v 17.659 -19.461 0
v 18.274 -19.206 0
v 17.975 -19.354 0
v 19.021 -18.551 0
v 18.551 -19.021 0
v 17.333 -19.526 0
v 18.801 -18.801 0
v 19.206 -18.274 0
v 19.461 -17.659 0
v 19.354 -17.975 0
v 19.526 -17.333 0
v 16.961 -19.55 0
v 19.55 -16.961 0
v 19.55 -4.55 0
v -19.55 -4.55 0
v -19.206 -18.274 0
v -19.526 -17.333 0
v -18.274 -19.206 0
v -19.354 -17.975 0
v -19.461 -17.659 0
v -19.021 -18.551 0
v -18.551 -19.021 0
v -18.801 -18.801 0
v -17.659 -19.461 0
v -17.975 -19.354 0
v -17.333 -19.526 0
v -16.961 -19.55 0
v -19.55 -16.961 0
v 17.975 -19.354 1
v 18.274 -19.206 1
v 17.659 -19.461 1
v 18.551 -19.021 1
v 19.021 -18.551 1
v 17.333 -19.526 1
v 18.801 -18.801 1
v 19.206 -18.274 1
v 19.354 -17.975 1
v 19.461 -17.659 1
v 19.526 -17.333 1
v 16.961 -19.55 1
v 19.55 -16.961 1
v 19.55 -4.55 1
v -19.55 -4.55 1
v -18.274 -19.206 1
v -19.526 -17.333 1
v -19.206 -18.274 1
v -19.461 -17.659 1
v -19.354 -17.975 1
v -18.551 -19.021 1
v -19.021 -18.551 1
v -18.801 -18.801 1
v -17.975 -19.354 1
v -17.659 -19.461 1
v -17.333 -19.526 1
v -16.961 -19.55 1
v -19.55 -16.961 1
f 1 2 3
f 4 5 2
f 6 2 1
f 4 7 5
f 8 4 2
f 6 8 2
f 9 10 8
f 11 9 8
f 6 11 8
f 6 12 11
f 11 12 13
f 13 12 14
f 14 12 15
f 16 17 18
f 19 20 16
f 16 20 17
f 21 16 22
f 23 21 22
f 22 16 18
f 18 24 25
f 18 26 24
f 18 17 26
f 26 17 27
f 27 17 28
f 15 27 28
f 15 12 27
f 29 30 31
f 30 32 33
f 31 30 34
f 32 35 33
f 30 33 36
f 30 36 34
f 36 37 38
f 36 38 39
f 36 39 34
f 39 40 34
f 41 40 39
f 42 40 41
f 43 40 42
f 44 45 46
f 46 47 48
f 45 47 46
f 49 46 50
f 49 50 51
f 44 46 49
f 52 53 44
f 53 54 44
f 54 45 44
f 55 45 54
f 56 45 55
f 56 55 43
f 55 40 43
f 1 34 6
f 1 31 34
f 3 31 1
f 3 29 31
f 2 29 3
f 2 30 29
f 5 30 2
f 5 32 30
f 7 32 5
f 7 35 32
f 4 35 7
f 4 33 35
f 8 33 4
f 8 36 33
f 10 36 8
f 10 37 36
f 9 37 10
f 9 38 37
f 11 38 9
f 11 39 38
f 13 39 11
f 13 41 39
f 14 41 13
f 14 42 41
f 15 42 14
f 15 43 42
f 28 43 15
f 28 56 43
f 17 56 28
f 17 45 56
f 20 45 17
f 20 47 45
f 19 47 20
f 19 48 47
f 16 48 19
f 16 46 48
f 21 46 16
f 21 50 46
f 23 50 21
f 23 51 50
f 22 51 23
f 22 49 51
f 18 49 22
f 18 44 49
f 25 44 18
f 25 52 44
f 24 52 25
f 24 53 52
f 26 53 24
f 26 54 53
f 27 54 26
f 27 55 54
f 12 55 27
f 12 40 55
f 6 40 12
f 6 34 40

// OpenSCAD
// Flex label (idea from MakerWorld "Gridfinity Flex label", 2026-11-01): a groove in the inside of the lip, the
// label a 1 mm plate bent in and sprung into the groove on the front and both sides. Everything stays under the
// stacking line (a bin stacked on top reaches down to 3.74 below the lip top), so the bins still stack.
//
// Light bin lip (scad/label_clip.scad has the measurements; y inwards from the outer face, z down from the lip top):
// the groove takes the place of the lip's bulge. Back at y = 1.0 (1.0 of wall stays), ceiling 45 deg (prints without
// support), floor flat at -5.25 on the lip's lower chamfer (1.3 mm ledge). Label 1.0 thick from -5.15 to -4.15; the
// ceiling holds its edge from above for 0.8 mm (the opening above it is at y 1.985).
//
//   part = "bin":   the light bin STL `bin` with the groove cut (cells_x x cells_y, any height)
//   part = "label": the label for a bin cells_x wide, `depth` deep, rounded front corners to follow the groove
//
// Stops (2026-11-02: 1- and 2-wide labels in a corner of a wider bin): at every joint between cells the groove
// is left out for STOP_W on the front and the back wall, so the lip's bulge stands there (to y 2.63) and stops a short
// label sliding out of its corner. A label crossing a joint has a notch for the stop (full-width labels too; notched
// labels still fit bins without stops). Corner label: `corner = "left"` or "right", `cells_x` long, in a bin `bin_x`
// wide; its end sits STOP_W / 2 + clr short of the joint. Spring it in like the full-width one (bow it slightly).
//
// Snap (2026-11-02: the corner labels and even a 2-wide label in a 2-wide bin fell out: the 1 mm plate lies loose
// in the groove, nothing holds its edge in). With `snap` the groove floor is a trench at the back (y GB to TRENCH_Y, down
// to -5.3) and a ledge in front of it (the rest of the lip's bulge, top at -4.9); the label gets a bead `snap` high under
// its edge that drops into the trench. To come out the bead has to climb the ledge, and the groove's ceiling over the
// label's edge leaves it no room to: it clicks in and out by bending (interference about snap - 0.25). Plate 0.9, top at
// -4.0, under the stacking line (-3.74). Snap labels print upside down (face with the text on the bed, the bead up).
// DejaVu Sans: from the system fonts (fonts-dejavu in the OpenSCAD image)

part = "label";
bin = "";            // the light bin STL to cut (part = "bin")
cells_x = 1;
cells_y = 1;
top = 0;             // z of the bin's lip top (part = "bin"; 7 * height + 3.74)
depth = 15;          // label depth, from the groove at the front
thick = 1.0;
clr = 0.2;           // label edge to the groove's back
walls = [1, 1, 1];   // groove in the front, left, right wall (the label is held on these three)
corner = "none";     // label: "none" = full width of a cells_x bin; "left" / "right" = corner label cells_x long in a bin_x bin
bin_x = 0;           // corner label: the bin's width in cells (0 = cells_x + 1; only the corner's shape matters)
centre = true;       // corner label: centred on x for printing (false: where it sits in the bin, for checks)
fit = undef;         // label: press fit instead of clr: the ends reach fit / 2 past the groove's back (side walls, divider tab), so the
                     // bendy walls press on them (2026-11-02: the loose labels fell out of the bins already printed)
tab = false;         // corner label: ends at a divider's tab (scad/rib_bin.scad tab = true) instead of a stop
DIV_T = 1.2;         // divider thickness (scad/rib_bin.scad T)
snap = 0;            // label: bead height under the edge (0 = none; for bins with the snap groove)
snap_thick = 0.9;    // snap label plate (1.0 touches the lip at the bin's corners by 0.05)
txt = "";
txt_size = 6;
txt_depth = 0.4;

$fn = 48;
R = 3.75;
GB = 1.0;                       // groove back
G_TOP = -4.05; G_FLOOR = -5.25; // groove flat back from G_TOP to G_FLOOR
STOP_W = 2.0;                   // stop at each joint: the groove is left out this wide
BULGE_Y = 2.63;                 // the lip's bulge (left standing at a stop)
TRENCH_Y = 1.95; SNAP_FLOOR = -5.3; SNAP_LEDGE = -4.9;   // snap groove: trench to TRENCH_Y, the ledge in front of it
BEAD_W = 0.65;                  // snap label: bead width from the edge (0.15 clear of the trench at the front)
W = 42 * cells_x - 0.5; D = 42 * cells_y - 0.5;

// W, D passed in so scad/rib_bin.scad can `use` the groove for its final bin
module outline(W = W, D = D) { offset(r = R) offset(delta = -R) square([W, D], center = true); }
module inset(y, W = W, D = D) { if (y <= 0) outline(W, D); else offset(r = -y) outline(W, D); }
module band(ya, yb, W = W, D = D) { difference() { inset(ya, W, D); inset(yb, W, D); } }
module slab(z0, z1) { translate([0, 0, z0 - 0.002]) linear_extrude(z1 - z0 + 0.004) children(); }
// the walls that get the groove: front (-y), left (-x), right (+x), optional back (+y); without the back it stops short of the back corners
module wall_zone(W = W, D = D, walls = walls) {
  intersection() {
    square([W + 2, D + 2], center = true);
    union() {
      if (walls[0]) translate([-W / 2 - 1, -D / 2 - 1]) square([W + 2, D / 2 + 1]);
      if (walls[1]) translate([-W / 2 - 1, -D / 2 - 1]) square([W / 2 + 1, D + 2 - 2 * R - 2]);
      if (walls[2]) translate([0, -D / 2 - 1]) square([W / 2 + 1, D + 2 - 2 * R - 2]);
      if (len(walls) > 3 && walls[3]) translate([-W / 2 - 1, 0]) square([W + 2, D / 2 + 1]);   // back: all four, the groove runs round
    }
  }
}

// joints between cells for a bin outline W wide (x positions)
function joints(W) = let(n = round((W + 0.5) / 42 * 2) / 2) [for (j = [1 : 1 : n - 1]) -W / 2 - 0.25 + 42 * j];

module groove(W = W, D = D, walls = walls, stops = false, snap = false) {
  difference() {
    intersection() {
      union() {
        slab(snap ? SNAP_LEDGE : G_FLOOR, G_TOP) band(GB, 4, W, D);               // the flat back and the floor
        if (snap) slab(SNAP_FLOOR, SNAP_LEDGE) band(GB, TRENCH_Y, W, D);          // the trench for the label's bead
        for (z = [G_TOP : 0.1 : -2.5]) slab(z, z + 0.1) band(GB + (z - G_TOP), 4, W, D);   // 45 deg ceiling
      }
      translate([0, 0, -10]) linear_extrude(20) wall_zone(W, D, walls);
    }
    if (stops) for (x = joints(W), s = [-1, 1])   // front and back wall: the bulge stays (it is air past BULGE_Y anyway)
      translate([x - STOP_W / 2, s < 0 ? -D / 2 - 1 : D / 2 - BULGE_Y, -10]) cube([STOP_W, BULGE_Y + 1, 20]);
  }
}

module label() {
  e = GB + clr;   // the label's edge from the outer face
  BX = corner == "none" ? cells_x : (bin_x > 0 ? bin_x : cells_x + 1);
  BW = 42 * BX - 0.5;
  es = is_undef(fit) ? e : GB - fit / 2;                          // the ends (and corners) from the outer face; the front edge stays at e
  x0 = -BW / 2 - 1;                                               // (the outline ends it)
  j1 = -BW / 2 + 42 * cells_x - 0.25;                             // the joint a corner label ends at
  x1 = corner == "none" ? BW / 2 : tab ? j1 - DIV_T / 2 + (is_undef(fit) ? -clr : fit / 2) : j1 - STOP_W / 2 - clr;
  notch = [for (x = joints(BW)) if (x < x1 - 1) x];
  cx = (-BW / 2 + es + x1) / 2;
  mirror([corner == "right" ? 1 : 0, 0, 0]) translate([corner == "none" || !centre ? 0 : -cx, 0, 0]) difference() {
    for (z = snap > 0 ? [[0, snap_thick, 0], [-snap, 0, BEAD_W]] : [[0, thick, 0]]) translate([0, 0, z[0]]) linear_extrude(z[1] - z[0]) difference() {
      intersection() {
        union() {   // fit: the ends press on the straight wall only (the groove's back is up to 0.13 further in round the corners)
          inset(e, BW, D);
          intersection() { inset(es, BW, D); translate([-BW, -D / 2 + R + 0.5]) square([2 * BW, D]); }
        }
        translate([x0, -D / 2 + e]) square([x1 - x0, depth]);
      }
      if (z[2] > 0) inset(e + z[2], BW, D);   // the bead: a band along the edge
      for (x = notch) translate([x - STOP_W / 2 - clr, -D / 2]) square([STOP_W + 2 * clr, BULGE_Y + clr]);
    }
    if (txt != "") translate([cx, -D / 2 + e + depth / 2, (snap > 0 ? snap_thick : thick) - txt_depth]) linear_extrude(txt_depth + 0.01)
      mirror([corner == "right" ? 1 : 0, 0, 0]) text(txt, size = txt_size, font = "DejaVu Sans", halign = "center", valign = "center");
  }
}

if (part == "bin") difference() { import(bin); translate([0, 0, top]) groove(); }
if (part == "label") { if (snap > 0) rotate([180, 0, 0]) translate([0, 0, -snap_thick]) label(); else label(); }
